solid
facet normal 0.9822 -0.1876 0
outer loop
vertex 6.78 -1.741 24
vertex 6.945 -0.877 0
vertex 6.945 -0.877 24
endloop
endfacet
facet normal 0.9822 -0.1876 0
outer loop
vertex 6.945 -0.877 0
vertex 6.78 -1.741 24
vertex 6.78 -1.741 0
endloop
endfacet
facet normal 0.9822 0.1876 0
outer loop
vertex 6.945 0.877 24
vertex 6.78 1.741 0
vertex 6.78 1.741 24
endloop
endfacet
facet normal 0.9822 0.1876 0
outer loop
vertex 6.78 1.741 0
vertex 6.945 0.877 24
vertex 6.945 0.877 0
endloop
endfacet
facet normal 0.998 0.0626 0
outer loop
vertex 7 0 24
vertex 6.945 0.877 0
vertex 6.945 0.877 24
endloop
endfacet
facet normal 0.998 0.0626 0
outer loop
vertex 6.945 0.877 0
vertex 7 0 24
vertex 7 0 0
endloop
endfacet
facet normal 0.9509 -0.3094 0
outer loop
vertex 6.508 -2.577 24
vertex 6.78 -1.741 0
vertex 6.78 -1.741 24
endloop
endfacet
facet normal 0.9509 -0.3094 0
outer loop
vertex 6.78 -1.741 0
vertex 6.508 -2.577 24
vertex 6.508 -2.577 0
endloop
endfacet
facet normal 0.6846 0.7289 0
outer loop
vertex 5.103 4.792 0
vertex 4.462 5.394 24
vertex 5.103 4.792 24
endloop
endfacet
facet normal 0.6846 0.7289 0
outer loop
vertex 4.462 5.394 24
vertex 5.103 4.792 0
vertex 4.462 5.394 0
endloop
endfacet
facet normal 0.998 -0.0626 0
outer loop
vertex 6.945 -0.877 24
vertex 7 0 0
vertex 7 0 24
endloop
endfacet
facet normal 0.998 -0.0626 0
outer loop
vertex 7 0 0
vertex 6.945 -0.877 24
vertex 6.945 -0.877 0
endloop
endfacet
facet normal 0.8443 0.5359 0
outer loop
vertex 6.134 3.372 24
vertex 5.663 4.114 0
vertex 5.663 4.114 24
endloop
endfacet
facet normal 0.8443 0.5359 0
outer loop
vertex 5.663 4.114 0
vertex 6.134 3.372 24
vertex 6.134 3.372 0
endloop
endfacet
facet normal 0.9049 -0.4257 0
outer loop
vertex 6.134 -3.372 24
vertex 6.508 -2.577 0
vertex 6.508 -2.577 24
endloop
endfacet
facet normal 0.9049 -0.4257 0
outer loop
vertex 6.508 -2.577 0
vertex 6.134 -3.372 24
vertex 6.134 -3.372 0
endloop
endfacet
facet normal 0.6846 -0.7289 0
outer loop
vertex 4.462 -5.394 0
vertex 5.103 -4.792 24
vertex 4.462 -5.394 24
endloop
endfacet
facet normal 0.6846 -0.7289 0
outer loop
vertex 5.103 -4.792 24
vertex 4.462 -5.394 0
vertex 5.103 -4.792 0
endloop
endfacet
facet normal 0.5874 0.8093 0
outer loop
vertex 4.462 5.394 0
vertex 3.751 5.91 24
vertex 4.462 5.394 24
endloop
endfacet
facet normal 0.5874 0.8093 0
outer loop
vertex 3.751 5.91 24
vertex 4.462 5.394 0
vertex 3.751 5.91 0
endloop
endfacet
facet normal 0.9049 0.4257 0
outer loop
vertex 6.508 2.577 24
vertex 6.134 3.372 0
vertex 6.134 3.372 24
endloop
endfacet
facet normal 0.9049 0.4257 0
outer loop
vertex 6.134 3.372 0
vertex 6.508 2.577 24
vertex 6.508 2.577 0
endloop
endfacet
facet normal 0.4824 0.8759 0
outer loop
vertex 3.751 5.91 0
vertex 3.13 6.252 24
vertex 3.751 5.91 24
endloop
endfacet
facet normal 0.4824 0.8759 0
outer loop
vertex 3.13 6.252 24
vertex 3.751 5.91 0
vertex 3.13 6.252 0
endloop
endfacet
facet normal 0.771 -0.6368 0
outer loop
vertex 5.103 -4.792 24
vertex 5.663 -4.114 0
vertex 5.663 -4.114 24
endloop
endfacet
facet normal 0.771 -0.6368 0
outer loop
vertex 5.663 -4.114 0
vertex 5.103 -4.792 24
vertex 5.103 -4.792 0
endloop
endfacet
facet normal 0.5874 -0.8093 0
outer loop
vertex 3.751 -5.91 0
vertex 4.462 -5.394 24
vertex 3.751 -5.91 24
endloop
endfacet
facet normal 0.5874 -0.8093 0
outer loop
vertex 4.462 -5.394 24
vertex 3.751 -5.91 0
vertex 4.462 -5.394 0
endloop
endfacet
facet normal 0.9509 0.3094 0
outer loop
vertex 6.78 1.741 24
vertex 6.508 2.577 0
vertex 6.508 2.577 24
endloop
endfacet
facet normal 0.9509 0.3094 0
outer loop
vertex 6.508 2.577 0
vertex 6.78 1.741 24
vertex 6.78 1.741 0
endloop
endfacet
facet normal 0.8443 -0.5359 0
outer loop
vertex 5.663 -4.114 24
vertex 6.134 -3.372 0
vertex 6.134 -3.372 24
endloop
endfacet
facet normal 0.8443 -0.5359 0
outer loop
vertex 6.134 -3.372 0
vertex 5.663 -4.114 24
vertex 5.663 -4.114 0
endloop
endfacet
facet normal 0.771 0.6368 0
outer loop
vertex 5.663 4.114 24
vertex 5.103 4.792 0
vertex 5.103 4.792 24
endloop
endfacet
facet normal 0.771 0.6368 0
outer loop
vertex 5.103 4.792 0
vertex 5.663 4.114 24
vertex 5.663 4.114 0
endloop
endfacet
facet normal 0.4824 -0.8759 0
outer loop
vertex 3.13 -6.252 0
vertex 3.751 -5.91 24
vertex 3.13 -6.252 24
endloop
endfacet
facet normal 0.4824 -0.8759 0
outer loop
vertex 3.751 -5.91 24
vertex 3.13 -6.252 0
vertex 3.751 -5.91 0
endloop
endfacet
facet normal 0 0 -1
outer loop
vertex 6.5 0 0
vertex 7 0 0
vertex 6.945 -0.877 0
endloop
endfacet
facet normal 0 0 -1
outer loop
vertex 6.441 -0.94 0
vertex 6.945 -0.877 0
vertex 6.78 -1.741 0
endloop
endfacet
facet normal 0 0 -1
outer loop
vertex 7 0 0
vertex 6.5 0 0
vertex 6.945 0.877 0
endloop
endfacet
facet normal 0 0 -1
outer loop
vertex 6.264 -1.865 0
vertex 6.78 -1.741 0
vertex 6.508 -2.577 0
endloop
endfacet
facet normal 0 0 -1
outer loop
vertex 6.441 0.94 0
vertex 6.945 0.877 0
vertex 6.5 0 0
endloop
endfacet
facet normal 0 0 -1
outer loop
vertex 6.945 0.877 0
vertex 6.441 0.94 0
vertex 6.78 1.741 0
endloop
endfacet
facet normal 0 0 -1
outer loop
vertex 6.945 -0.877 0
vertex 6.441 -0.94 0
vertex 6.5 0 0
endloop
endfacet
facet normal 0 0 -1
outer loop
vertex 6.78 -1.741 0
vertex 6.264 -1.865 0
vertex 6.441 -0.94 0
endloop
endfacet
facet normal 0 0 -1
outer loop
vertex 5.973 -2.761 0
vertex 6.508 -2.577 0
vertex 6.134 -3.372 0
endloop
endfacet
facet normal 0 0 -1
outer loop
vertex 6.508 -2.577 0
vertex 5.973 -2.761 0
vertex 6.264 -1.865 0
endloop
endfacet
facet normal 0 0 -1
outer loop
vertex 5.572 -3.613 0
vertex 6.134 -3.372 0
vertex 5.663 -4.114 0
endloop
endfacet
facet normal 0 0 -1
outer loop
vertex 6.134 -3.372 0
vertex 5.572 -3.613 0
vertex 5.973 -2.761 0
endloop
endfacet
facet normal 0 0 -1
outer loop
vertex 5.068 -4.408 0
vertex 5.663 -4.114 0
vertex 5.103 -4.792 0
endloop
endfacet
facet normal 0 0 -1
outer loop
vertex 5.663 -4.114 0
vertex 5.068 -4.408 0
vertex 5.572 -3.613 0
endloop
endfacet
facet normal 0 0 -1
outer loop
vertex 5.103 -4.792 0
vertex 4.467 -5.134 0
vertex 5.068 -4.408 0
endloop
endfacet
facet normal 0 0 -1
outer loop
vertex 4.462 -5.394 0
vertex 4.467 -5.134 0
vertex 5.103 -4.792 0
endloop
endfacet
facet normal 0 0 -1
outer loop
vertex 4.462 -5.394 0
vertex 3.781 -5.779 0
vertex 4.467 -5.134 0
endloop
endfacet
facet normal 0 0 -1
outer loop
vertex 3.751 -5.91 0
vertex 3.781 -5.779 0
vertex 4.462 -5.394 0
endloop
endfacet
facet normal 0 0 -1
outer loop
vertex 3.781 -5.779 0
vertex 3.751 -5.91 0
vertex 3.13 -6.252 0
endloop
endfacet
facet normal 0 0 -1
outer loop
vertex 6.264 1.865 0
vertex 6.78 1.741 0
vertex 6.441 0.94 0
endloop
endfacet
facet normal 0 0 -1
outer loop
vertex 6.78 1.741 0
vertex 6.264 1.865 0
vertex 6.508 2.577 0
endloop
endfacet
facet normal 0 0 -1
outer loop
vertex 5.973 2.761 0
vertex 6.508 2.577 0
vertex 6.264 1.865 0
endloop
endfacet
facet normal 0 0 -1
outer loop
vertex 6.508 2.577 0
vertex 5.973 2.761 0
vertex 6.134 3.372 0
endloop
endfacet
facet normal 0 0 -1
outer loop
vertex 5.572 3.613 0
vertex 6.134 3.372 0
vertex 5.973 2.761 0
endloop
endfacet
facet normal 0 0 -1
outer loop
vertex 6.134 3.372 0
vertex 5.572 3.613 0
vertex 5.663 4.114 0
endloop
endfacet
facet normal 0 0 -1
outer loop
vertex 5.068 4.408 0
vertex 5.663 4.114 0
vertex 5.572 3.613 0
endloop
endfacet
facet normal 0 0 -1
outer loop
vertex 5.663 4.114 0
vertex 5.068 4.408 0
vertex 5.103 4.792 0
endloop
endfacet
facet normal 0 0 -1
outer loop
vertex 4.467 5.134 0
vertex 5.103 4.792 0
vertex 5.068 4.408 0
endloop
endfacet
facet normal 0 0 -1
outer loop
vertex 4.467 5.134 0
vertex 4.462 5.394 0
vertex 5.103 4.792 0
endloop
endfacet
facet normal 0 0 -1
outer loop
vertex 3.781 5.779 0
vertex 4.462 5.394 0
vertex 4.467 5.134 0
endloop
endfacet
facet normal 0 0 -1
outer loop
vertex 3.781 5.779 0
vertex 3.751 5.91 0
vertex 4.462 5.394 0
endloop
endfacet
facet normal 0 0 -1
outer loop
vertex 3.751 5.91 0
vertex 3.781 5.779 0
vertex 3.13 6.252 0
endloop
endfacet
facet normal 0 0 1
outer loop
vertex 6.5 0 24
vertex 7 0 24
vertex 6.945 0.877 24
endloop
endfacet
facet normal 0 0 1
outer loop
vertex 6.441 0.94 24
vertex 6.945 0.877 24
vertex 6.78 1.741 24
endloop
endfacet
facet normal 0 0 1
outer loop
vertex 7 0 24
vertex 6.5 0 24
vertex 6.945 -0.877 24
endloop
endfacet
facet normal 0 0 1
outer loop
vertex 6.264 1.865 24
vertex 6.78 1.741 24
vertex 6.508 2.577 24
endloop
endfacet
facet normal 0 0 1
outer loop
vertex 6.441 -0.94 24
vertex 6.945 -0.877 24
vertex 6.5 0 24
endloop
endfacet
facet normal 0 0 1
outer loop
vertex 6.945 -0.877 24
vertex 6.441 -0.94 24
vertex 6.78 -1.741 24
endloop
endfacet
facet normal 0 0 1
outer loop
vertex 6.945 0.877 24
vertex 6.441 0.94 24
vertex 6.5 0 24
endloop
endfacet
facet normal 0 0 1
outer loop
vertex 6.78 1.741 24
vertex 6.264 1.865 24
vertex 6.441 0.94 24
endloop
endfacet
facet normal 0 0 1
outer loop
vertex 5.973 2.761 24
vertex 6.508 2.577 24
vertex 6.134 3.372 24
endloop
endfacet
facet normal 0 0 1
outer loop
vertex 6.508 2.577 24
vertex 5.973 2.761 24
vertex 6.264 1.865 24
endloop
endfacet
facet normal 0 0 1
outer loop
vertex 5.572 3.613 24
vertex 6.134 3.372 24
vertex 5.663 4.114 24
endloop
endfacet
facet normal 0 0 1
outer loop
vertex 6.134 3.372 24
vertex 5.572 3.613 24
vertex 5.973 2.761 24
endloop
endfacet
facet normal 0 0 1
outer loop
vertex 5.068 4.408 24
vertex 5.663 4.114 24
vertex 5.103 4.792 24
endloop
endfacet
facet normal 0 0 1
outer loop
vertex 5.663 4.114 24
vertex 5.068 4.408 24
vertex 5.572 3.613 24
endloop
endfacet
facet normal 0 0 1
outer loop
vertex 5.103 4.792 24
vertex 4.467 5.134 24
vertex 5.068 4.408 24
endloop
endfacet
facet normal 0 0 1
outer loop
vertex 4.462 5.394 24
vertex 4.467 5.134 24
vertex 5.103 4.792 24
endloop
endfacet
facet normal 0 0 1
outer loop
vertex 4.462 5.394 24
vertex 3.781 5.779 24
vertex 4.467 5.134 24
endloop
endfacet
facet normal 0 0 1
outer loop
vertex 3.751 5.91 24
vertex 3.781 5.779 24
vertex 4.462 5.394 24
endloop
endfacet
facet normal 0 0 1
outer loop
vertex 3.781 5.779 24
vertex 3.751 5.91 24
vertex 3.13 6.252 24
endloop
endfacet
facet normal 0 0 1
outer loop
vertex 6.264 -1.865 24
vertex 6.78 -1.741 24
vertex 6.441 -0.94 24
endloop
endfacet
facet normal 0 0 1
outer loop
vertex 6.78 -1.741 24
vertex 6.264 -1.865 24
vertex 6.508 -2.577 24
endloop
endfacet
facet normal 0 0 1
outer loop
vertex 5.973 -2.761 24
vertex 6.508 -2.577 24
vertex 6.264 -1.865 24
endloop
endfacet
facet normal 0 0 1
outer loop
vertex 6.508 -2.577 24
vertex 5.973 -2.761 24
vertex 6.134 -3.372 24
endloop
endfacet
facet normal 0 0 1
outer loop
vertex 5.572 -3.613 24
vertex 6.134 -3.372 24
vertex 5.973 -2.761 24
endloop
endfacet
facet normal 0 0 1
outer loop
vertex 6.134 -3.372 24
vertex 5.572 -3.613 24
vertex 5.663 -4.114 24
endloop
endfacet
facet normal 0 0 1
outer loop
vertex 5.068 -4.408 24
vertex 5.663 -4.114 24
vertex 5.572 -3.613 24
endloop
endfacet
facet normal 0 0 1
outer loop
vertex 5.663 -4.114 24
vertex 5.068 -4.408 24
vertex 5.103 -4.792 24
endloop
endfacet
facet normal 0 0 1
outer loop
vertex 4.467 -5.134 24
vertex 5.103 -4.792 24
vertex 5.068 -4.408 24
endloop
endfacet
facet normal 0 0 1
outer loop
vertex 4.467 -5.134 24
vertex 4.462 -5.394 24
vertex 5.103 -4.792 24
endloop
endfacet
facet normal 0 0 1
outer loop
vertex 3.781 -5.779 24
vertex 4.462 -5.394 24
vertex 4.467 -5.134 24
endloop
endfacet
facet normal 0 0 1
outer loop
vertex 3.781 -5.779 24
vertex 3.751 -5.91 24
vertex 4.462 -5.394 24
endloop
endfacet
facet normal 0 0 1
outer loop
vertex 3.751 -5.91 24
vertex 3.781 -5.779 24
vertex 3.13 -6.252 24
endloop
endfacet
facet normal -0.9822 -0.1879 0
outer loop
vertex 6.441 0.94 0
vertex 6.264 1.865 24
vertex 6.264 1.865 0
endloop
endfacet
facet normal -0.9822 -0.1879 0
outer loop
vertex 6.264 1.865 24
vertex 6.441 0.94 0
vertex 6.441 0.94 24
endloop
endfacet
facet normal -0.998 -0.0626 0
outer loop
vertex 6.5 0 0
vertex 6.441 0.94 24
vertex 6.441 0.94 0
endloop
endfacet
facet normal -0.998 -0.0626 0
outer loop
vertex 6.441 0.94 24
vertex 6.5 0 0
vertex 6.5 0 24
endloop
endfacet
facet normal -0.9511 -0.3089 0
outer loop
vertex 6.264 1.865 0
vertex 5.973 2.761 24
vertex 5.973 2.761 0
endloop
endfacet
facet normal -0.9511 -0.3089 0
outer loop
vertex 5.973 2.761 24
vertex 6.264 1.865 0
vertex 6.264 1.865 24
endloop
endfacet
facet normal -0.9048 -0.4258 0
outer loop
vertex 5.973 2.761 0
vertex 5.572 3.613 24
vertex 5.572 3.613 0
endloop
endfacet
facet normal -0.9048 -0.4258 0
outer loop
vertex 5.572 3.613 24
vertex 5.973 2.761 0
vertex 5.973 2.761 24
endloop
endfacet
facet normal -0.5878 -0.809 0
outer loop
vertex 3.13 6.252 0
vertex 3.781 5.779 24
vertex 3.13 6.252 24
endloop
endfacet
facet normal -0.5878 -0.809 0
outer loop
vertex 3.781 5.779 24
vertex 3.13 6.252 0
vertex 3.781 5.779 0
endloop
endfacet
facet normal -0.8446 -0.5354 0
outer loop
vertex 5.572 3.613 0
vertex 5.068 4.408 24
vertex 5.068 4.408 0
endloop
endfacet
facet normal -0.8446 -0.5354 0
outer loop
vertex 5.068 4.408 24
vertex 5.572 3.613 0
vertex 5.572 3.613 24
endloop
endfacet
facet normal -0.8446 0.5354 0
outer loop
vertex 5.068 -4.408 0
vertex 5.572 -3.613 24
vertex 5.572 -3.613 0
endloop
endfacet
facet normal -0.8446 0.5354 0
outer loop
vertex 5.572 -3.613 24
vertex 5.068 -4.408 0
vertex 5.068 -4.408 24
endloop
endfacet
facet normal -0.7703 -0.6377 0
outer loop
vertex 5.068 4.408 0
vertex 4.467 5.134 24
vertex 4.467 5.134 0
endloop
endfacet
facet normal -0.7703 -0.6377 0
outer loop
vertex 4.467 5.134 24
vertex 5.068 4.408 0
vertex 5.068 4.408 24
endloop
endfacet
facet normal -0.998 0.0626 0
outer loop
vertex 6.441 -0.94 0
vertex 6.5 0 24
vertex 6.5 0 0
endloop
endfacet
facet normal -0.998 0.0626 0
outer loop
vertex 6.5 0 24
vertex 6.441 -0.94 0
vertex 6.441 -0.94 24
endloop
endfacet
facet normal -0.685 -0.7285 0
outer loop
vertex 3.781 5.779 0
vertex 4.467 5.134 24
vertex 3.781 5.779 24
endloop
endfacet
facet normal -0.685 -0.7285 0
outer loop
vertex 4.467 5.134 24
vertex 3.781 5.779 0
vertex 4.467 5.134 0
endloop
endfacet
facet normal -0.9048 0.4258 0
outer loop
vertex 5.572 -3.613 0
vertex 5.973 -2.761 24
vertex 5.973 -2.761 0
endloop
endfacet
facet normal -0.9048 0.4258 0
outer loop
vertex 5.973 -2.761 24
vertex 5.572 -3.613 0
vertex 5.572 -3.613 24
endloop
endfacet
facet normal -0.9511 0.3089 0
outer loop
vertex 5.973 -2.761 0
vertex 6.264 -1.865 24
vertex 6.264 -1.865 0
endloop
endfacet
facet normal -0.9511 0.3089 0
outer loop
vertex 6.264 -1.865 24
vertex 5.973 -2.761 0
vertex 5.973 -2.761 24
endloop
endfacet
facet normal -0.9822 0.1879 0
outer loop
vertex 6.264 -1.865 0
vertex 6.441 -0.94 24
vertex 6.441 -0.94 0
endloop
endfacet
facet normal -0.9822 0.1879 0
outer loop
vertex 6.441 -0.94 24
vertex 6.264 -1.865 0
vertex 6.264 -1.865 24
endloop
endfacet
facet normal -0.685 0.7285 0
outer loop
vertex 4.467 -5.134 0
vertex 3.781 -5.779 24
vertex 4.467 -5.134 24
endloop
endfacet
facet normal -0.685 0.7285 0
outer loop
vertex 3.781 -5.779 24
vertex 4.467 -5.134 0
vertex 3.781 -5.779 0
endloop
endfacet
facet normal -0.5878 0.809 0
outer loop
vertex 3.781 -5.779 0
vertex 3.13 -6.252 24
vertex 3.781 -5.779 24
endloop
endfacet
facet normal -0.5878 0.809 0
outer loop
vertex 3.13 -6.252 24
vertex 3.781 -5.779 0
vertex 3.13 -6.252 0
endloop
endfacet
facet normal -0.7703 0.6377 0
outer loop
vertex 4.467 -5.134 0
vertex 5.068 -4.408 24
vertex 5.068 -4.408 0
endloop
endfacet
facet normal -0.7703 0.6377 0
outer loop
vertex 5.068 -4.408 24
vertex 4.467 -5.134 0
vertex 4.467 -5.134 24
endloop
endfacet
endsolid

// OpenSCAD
$fn = 50;


difference() {
	union() {
		cylinder(h = 24, r = 7.0000000000);
		translate(v = [-4.0000000000, 0, 0]) {
			cylinder(h = 24, r = 7.0000000000);
		}
	}
	union() {
		cylinder(h = 24, r = 3.2500000000);
		cylinder(h = 24, r = 1.8000000000);
		cylinder(h = 24, r = 1.8000000000);
		cylinder(h = 24, r = 1.8000000000);
		translate(v = [-8.5000000000, 0, 0]) {
			hull() {
				translate(v = [-3.7500000000, 0.0000000000, 0]) {
					cylinder(h = 24, r = 7.5000000000);
				}
				translate(v = [3.7500000000, 0.0000000000, 0]) {
					cylinder(h = 24, r = 7.5000000000);
				}
				translate(v = [-3.7500000000, -0.0000000000, 0]) {
					cylinder(h = 24, r = 7.5000000000);
				}
				translate(v = [3.7500000000, -0.0000000000, 0]) {
					cylinder(h = 24, r = 7.5000000000);
				}
			}
		}
		translate(v = [-1.0000000000, 0, 0.0000000000]) {
			cylinder(h = 24, r = 7.5000000000);
		}
	}
}
